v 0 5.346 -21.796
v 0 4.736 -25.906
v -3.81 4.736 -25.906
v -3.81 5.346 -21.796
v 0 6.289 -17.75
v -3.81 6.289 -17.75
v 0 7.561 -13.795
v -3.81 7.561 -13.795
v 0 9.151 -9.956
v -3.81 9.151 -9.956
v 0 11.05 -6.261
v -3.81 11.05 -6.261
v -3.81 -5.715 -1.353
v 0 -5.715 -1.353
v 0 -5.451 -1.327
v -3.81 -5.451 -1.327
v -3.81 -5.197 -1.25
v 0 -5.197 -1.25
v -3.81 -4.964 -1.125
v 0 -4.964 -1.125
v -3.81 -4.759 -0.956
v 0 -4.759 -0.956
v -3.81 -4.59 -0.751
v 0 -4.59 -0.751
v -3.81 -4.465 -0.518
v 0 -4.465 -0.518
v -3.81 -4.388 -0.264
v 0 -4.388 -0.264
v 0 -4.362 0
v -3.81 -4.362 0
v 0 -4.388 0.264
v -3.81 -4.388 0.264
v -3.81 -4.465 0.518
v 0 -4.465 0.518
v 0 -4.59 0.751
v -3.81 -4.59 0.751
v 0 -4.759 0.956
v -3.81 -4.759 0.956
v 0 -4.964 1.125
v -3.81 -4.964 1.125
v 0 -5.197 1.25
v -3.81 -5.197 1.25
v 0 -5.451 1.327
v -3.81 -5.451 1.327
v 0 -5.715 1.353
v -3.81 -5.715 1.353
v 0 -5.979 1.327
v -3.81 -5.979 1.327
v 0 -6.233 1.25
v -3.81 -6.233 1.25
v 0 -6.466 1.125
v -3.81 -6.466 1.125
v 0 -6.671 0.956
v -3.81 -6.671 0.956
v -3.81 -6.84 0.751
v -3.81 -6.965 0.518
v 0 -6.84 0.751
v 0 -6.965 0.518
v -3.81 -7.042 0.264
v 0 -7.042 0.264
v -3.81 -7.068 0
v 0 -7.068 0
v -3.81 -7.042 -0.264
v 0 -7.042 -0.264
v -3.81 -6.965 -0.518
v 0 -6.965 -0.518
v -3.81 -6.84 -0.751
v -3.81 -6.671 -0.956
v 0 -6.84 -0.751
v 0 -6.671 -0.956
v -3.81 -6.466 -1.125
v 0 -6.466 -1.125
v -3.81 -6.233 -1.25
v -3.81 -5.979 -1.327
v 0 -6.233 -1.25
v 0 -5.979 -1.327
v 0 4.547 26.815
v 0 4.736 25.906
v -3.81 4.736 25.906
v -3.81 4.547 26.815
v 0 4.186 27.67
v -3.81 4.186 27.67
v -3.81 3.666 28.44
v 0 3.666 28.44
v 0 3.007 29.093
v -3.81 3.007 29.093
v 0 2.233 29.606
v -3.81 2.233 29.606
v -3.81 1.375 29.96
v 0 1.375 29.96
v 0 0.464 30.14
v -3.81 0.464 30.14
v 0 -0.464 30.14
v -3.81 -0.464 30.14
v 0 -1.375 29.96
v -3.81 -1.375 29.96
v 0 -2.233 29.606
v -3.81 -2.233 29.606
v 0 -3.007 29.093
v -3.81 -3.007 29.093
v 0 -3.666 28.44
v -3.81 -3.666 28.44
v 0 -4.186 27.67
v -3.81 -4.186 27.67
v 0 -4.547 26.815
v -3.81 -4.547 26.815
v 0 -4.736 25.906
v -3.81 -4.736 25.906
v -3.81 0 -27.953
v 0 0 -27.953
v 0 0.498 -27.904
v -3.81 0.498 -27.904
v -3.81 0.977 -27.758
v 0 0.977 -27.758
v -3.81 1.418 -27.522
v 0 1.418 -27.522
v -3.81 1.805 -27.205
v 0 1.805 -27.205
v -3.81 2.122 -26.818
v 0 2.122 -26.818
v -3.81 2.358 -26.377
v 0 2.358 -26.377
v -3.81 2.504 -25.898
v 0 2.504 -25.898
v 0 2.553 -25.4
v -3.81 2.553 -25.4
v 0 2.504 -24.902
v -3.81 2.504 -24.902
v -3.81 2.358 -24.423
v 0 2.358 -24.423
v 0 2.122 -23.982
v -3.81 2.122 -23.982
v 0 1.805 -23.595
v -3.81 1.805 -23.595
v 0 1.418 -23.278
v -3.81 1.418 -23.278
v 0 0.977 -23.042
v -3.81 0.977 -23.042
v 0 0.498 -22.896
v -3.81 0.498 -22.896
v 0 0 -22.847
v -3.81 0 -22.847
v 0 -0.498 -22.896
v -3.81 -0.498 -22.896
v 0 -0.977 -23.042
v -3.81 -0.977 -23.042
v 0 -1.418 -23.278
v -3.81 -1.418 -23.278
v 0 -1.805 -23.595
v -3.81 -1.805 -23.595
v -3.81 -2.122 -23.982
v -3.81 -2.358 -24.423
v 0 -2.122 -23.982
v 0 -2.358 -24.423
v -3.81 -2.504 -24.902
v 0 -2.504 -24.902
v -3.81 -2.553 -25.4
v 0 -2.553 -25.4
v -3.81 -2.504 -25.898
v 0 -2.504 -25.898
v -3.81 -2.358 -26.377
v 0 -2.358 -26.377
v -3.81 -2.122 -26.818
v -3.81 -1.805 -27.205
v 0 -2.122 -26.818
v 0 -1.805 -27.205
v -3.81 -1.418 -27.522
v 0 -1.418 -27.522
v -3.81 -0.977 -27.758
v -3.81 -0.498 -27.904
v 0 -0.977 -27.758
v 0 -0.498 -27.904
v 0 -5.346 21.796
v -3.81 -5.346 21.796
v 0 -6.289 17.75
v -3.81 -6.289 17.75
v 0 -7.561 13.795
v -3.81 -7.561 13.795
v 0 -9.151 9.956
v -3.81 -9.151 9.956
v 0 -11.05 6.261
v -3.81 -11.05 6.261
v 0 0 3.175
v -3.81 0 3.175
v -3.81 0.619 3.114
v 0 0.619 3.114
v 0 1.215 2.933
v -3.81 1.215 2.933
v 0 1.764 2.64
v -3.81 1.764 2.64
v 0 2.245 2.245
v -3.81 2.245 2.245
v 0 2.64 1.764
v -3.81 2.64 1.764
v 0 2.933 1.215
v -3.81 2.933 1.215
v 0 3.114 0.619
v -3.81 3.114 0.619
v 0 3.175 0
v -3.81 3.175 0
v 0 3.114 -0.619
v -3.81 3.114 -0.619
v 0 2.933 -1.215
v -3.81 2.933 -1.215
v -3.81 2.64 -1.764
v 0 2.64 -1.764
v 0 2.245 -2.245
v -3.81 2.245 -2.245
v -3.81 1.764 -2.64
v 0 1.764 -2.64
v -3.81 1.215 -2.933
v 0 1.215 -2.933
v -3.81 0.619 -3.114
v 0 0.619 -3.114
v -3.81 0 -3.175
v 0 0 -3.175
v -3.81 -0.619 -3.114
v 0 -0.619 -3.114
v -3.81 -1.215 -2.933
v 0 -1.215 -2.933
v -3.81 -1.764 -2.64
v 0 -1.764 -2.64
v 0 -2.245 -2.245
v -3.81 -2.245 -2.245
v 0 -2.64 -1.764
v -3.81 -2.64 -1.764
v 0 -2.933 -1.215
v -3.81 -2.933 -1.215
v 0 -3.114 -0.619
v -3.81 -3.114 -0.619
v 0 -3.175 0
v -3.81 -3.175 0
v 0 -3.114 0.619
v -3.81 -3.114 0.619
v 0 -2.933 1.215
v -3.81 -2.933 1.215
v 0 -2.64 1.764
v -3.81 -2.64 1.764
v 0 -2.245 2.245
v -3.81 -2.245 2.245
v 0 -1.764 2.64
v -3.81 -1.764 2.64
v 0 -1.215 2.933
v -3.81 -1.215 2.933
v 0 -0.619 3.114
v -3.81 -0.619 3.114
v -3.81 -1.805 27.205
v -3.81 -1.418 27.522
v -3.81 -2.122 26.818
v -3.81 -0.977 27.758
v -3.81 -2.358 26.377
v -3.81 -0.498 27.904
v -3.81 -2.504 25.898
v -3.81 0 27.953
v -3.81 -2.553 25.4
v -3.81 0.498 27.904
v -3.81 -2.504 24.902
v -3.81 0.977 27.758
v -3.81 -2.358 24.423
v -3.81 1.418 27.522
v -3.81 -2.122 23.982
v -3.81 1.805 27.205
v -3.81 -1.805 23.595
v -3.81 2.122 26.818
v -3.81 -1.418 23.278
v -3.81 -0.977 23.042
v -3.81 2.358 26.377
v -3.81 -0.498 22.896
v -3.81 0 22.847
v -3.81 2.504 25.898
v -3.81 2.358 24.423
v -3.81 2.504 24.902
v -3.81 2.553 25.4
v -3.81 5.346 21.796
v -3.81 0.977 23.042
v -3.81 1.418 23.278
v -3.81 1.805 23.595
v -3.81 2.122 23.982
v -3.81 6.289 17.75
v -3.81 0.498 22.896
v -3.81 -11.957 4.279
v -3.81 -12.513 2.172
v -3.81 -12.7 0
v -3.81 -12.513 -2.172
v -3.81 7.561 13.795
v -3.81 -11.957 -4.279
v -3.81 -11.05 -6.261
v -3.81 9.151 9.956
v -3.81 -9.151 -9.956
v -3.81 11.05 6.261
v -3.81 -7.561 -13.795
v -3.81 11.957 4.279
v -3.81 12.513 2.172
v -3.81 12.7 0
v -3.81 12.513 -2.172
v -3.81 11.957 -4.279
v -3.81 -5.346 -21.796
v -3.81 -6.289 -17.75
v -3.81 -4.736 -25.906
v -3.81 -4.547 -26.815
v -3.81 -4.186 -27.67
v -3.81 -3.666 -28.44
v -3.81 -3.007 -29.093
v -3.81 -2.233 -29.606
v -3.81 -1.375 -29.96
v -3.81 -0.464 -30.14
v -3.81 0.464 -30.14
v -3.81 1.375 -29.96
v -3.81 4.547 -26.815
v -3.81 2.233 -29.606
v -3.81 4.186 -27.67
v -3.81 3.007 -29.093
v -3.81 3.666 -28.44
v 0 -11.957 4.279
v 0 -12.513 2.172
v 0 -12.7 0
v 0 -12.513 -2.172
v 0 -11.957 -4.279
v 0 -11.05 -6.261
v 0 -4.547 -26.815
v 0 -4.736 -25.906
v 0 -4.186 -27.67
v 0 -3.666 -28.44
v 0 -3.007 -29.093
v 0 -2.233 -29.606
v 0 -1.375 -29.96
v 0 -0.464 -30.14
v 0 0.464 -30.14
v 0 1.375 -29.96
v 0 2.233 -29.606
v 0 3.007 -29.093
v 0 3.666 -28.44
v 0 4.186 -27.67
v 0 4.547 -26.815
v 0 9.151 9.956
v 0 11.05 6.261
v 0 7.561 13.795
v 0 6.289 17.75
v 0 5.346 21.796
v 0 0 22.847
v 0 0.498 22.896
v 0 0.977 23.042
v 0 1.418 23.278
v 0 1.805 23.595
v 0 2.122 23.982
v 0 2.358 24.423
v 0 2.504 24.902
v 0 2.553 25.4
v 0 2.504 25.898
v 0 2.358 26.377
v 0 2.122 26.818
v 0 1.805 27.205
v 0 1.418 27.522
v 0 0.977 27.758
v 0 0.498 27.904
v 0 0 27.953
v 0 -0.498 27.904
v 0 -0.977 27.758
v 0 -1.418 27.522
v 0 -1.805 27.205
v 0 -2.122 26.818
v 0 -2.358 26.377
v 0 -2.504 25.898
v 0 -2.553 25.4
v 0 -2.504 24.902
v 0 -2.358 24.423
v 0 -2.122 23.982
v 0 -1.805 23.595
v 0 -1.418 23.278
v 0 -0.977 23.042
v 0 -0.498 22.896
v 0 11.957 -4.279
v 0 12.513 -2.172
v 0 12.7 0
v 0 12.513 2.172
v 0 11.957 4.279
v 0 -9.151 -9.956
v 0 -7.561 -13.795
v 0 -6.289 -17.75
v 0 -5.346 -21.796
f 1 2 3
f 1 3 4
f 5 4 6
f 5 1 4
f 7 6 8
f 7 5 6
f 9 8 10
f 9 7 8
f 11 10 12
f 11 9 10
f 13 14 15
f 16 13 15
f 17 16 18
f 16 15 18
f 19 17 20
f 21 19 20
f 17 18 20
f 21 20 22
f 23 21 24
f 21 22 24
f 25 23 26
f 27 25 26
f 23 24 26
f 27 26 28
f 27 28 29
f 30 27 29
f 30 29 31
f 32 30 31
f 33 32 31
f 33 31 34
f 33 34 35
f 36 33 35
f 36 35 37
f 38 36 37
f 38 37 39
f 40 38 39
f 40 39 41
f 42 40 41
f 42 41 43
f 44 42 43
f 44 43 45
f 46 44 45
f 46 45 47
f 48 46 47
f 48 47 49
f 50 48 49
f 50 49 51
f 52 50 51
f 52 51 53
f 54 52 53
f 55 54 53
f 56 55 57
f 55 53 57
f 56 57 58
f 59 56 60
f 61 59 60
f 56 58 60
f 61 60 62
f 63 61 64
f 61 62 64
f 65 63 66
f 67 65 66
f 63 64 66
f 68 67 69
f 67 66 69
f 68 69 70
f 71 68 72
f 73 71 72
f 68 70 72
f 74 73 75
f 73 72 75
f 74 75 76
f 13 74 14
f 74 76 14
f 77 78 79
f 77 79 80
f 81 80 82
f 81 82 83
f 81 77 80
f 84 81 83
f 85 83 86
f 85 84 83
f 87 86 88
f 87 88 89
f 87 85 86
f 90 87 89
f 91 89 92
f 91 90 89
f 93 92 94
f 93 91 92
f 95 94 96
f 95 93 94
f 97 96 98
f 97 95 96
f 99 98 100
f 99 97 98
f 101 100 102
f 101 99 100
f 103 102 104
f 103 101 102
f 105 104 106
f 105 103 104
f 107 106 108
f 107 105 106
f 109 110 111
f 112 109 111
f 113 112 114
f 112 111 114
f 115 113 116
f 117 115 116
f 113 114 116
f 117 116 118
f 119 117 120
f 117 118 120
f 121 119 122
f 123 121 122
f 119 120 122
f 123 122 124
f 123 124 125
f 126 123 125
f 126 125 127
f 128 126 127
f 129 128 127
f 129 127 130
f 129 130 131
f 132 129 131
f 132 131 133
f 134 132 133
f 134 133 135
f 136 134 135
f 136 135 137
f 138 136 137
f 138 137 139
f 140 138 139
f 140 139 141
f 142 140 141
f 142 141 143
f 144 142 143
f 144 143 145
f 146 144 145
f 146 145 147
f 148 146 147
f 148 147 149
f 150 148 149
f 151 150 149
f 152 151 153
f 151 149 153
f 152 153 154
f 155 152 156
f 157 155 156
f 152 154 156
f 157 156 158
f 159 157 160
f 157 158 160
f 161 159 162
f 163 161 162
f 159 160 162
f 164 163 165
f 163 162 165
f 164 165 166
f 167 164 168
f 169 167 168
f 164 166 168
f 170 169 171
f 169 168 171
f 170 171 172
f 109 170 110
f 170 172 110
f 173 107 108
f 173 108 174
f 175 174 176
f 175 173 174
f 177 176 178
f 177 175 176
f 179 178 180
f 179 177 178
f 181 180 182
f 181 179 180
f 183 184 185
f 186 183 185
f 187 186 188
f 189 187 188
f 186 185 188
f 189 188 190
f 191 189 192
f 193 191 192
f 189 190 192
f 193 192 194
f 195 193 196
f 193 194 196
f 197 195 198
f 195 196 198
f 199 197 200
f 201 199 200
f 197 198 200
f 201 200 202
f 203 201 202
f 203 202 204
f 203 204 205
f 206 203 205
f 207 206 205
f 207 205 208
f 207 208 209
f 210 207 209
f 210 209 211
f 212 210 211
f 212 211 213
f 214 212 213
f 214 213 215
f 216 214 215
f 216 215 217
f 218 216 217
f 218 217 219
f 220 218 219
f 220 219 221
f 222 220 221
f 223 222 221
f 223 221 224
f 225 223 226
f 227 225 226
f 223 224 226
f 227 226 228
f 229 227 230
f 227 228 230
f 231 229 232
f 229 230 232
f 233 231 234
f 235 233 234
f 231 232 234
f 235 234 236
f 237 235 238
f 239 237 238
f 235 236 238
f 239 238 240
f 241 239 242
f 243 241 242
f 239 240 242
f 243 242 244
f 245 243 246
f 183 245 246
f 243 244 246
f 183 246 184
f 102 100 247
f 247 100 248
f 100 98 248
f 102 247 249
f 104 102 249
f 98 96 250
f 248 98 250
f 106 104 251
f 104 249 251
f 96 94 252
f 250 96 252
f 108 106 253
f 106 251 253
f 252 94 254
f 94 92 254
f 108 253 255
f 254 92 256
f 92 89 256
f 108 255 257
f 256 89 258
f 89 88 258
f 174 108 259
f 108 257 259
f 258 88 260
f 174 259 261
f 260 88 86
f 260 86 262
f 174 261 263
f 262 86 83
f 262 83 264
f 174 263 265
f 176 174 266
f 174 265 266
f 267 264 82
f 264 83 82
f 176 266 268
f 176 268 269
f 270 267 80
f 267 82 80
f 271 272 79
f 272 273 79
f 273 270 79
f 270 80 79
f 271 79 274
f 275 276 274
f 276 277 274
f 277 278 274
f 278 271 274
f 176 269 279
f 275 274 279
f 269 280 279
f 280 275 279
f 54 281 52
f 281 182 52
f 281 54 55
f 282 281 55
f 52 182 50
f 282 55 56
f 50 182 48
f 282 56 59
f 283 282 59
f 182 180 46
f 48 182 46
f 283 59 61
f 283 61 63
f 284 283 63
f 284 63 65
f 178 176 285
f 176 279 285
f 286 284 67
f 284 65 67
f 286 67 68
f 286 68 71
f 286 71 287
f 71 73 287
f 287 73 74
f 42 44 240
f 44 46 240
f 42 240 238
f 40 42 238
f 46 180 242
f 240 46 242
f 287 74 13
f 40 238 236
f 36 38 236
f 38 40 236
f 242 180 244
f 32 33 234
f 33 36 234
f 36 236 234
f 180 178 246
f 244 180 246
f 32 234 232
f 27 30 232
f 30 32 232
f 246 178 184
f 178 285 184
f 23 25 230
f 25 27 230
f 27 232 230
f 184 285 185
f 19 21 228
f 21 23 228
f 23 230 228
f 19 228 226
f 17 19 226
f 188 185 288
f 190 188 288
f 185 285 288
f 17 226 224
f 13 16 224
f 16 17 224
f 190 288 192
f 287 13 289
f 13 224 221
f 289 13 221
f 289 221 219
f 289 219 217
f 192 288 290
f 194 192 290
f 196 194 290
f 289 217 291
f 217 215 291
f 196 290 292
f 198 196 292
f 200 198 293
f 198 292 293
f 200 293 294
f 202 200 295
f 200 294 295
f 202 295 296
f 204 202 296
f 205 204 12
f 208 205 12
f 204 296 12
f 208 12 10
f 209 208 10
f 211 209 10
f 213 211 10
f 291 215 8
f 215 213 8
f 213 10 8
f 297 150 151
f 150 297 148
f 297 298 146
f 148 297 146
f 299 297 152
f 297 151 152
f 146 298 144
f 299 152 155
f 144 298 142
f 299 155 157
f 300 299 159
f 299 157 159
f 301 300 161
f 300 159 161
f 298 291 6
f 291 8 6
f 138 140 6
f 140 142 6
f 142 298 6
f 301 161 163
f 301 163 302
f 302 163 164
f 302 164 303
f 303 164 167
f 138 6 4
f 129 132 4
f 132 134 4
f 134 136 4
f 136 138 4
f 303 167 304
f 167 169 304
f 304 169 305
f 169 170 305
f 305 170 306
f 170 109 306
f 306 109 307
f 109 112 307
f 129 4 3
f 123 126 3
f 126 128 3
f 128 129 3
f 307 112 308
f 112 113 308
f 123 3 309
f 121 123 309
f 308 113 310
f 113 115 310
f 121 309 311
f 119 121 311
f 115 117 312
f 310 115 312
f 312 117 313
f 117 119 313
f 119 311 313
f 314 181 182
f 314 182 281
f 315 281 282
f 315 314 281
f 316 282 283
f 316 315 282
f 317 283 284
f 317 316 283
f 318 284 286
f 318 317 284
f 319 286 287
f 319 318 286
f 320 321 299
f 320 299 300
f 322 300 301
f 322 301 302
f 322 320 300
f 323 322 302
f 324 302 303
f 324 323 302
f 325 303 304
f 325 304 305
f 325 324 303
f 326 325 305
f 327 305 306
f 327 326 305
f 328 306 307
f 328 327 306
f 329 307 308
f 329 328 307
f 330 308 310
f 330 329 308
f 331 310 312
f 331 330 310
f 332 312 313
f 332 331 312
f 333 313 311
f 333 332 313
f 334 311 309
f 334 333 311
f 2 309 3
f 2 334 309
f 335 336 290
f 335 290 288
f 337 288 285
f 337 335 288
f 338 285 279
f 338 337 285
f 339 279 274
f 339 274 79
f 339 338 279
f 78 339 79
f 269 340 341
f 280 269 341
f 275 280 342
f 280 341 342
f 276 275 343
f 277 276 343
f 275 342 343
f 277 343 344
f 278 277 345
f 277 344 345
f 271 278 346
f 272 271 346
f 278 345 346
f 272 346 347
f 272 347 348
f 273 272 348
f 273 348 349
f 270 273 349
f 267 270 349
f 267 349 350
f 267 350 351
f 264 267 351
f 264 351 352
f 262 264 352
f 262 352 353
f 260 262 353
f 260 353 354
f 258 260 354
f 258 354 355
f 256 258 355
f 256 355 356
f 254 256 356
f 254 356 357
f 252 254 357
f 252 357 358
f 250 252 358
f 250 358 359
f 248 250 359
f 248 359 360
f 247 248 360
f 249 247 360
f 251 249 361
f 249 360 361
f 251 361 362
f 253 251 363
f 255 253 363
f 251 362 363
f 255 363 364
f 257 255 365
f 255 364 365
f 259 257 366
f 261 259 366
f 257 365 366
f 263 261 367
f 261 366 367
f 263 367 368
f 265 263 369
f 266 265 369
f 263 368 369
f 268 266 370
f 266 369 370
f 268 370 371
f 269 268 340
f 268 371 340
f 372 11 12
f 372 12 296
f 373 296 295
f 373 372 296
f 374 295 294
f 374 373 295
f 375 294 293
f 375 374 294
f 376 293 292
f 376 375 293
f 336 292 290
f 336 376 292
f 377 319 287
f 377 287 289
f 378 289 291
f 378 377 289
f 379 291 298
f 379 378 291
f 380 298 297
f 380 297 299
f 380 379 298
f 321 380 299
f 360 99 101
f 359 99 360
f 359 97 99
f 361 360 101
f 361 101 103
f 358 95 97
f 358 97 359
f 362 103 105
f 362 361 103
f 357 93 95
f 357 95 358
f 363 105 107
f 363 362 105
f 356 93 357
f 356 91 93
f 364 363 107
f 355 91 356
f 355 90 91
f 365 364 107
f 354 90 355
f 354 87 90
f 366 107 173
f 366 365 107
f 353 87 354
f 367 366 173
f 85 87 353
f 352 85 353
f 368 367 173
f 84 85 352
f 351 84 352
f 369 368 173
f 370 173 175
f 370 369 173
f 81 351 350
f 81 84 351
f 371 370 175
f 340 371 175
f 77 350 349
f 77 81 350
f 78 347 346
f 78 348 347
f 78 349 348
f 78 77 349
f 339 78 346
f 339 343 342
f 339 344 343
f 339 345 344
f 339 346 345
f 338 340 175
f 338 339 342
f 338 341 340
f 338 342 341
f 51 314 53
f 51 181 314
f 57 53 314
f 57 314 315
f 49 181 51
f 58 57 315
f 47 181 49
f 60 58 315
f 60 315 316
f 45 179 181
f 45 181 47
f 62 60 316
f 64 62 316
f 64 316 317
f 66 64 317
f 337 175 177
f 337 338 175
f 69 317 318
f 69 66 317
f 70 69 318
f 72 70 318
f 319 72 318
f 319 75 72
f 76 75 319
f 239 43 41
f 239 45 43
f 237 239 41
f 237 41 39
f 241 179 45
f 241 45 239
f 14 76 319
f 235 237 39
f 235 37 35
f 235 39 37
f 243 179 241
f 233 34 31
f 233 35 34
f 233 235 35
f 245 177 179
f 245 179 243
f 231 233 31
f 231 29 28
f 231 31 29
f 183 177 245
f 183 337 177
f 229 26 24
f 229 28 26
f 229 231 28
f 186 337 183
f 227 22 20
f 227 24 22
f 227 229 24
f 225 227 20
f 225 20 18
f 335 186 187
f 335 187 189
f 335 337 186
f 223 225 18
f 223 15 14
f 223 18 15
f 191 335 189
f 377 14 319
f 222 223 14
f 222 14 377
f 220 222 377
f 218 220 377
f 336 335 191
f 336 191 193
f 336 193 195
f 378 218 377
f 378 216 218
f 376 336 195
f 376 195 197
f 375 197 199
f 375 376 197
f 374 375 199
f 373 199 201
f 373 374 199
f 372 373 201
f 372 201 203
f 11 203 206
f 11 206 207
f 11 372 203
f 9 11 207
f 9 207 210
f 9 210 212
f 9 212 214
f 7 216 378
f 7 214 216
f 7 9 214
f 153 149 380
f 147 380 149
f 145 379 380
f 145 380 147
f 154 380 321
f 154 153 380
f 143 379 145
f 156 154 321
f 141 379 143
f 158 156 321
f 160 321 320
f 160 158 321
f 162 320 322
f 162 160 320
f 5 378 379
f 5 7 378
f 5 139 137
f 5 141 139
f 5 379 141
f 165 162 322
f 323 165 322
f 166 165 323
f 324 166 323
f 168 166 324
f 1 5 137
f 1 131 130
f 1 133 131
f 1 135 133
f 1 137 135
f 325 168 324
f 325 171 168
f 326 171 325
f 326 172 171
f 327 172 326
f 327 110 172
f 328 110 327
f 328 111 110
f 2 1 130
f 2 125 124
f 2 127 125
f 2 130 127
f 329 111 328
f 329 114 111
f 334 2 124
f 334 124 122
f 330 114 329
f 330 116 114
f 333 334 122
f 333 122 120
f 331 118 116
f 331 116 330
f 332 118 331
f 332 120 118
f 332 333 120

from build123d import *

# Parameters (mm, degrees)
BOSS_EXTRUDE1_DEPTH    = 3.81
F_10_CLEARANCE_HOLE1_D = 5.1054
F_6_32_TAPPED_HOLE1_D  = 2.7051
SKETCH4_R              = 3.175
CUT_EXTRUDE1_DEPTH     = 33.948179104


with BuildPart() as part:
    # Sketch1 → Boss-Extrude1 (new body)
    with BuildSketch(Plane(origin=(0, 0, 0), x_dir=(0, 0, -1), z_dir=(1, 0, 0))):
        with BuildLine():
            ThreePointArc((-25.906015625, 4.73554162), (-30.1625, 0), (-25.906015625, -4.73554162))
            ThreePointArc((-25.906015625, -4.73554162), (-15.759385528, -6.884569442), (-6.260703125, -11.049597114))
            ThreePointArc((-6.260703125, -11.049597114), (0, -12.7), (6.260703125, -11.049597114))
            ThreePointArc((6.260703125, -11.049597114), (15.759385528, -6.884569442), (25.906015625, -4.73554162))
            ThreePointArc((25.906015625, -4.73554162), (30.1625, 0), (25.906015625, 4.73554162))
            ThreePointArc((25.906015625, 4.73554162), (15.759385528, 6.884569442), (6.260703125, 11.049597114))
            ThreePointArc((6.260703125, 11.049597114), (0, 12.7), (-6.260703125, 11.049597114))
            ThreePointArc((-6.260703125, 11.049597114), (-15.759385528, 6.884569442), (-25.906015625, 4.73554162))
        make_face()
    extrude(amount=-BOSS_EXTRUDE1_DEPTH)

    # #10 Clearance Hole1 (through all)
    with Locations(Plane.ZY.offset(3.81)):
        with Locations((-25.4, 0), (25.4, 0)):
            Hole(F_10_CLEARANCE_HOLE1_D / 2)

    # #6-32 Tapped Hole1 (through all)
    with Locations(Plane.ZY.offset(3.81)):
        with Locations((0, -5.715)):
            Hole(F_6_32_TAPPED_HOLE1_D / 2)

    # Sketch4 → Cut-Extrude1 (cut, through all)
    with BuildSketch(Plane.ZY.offset(3.81)):
        Circle(SKETCH4_R)
    extrude(amount=-CUT_EXTRUDE1_DEPTH, mode=Mode.SUBTRACT)


solid = part.part
